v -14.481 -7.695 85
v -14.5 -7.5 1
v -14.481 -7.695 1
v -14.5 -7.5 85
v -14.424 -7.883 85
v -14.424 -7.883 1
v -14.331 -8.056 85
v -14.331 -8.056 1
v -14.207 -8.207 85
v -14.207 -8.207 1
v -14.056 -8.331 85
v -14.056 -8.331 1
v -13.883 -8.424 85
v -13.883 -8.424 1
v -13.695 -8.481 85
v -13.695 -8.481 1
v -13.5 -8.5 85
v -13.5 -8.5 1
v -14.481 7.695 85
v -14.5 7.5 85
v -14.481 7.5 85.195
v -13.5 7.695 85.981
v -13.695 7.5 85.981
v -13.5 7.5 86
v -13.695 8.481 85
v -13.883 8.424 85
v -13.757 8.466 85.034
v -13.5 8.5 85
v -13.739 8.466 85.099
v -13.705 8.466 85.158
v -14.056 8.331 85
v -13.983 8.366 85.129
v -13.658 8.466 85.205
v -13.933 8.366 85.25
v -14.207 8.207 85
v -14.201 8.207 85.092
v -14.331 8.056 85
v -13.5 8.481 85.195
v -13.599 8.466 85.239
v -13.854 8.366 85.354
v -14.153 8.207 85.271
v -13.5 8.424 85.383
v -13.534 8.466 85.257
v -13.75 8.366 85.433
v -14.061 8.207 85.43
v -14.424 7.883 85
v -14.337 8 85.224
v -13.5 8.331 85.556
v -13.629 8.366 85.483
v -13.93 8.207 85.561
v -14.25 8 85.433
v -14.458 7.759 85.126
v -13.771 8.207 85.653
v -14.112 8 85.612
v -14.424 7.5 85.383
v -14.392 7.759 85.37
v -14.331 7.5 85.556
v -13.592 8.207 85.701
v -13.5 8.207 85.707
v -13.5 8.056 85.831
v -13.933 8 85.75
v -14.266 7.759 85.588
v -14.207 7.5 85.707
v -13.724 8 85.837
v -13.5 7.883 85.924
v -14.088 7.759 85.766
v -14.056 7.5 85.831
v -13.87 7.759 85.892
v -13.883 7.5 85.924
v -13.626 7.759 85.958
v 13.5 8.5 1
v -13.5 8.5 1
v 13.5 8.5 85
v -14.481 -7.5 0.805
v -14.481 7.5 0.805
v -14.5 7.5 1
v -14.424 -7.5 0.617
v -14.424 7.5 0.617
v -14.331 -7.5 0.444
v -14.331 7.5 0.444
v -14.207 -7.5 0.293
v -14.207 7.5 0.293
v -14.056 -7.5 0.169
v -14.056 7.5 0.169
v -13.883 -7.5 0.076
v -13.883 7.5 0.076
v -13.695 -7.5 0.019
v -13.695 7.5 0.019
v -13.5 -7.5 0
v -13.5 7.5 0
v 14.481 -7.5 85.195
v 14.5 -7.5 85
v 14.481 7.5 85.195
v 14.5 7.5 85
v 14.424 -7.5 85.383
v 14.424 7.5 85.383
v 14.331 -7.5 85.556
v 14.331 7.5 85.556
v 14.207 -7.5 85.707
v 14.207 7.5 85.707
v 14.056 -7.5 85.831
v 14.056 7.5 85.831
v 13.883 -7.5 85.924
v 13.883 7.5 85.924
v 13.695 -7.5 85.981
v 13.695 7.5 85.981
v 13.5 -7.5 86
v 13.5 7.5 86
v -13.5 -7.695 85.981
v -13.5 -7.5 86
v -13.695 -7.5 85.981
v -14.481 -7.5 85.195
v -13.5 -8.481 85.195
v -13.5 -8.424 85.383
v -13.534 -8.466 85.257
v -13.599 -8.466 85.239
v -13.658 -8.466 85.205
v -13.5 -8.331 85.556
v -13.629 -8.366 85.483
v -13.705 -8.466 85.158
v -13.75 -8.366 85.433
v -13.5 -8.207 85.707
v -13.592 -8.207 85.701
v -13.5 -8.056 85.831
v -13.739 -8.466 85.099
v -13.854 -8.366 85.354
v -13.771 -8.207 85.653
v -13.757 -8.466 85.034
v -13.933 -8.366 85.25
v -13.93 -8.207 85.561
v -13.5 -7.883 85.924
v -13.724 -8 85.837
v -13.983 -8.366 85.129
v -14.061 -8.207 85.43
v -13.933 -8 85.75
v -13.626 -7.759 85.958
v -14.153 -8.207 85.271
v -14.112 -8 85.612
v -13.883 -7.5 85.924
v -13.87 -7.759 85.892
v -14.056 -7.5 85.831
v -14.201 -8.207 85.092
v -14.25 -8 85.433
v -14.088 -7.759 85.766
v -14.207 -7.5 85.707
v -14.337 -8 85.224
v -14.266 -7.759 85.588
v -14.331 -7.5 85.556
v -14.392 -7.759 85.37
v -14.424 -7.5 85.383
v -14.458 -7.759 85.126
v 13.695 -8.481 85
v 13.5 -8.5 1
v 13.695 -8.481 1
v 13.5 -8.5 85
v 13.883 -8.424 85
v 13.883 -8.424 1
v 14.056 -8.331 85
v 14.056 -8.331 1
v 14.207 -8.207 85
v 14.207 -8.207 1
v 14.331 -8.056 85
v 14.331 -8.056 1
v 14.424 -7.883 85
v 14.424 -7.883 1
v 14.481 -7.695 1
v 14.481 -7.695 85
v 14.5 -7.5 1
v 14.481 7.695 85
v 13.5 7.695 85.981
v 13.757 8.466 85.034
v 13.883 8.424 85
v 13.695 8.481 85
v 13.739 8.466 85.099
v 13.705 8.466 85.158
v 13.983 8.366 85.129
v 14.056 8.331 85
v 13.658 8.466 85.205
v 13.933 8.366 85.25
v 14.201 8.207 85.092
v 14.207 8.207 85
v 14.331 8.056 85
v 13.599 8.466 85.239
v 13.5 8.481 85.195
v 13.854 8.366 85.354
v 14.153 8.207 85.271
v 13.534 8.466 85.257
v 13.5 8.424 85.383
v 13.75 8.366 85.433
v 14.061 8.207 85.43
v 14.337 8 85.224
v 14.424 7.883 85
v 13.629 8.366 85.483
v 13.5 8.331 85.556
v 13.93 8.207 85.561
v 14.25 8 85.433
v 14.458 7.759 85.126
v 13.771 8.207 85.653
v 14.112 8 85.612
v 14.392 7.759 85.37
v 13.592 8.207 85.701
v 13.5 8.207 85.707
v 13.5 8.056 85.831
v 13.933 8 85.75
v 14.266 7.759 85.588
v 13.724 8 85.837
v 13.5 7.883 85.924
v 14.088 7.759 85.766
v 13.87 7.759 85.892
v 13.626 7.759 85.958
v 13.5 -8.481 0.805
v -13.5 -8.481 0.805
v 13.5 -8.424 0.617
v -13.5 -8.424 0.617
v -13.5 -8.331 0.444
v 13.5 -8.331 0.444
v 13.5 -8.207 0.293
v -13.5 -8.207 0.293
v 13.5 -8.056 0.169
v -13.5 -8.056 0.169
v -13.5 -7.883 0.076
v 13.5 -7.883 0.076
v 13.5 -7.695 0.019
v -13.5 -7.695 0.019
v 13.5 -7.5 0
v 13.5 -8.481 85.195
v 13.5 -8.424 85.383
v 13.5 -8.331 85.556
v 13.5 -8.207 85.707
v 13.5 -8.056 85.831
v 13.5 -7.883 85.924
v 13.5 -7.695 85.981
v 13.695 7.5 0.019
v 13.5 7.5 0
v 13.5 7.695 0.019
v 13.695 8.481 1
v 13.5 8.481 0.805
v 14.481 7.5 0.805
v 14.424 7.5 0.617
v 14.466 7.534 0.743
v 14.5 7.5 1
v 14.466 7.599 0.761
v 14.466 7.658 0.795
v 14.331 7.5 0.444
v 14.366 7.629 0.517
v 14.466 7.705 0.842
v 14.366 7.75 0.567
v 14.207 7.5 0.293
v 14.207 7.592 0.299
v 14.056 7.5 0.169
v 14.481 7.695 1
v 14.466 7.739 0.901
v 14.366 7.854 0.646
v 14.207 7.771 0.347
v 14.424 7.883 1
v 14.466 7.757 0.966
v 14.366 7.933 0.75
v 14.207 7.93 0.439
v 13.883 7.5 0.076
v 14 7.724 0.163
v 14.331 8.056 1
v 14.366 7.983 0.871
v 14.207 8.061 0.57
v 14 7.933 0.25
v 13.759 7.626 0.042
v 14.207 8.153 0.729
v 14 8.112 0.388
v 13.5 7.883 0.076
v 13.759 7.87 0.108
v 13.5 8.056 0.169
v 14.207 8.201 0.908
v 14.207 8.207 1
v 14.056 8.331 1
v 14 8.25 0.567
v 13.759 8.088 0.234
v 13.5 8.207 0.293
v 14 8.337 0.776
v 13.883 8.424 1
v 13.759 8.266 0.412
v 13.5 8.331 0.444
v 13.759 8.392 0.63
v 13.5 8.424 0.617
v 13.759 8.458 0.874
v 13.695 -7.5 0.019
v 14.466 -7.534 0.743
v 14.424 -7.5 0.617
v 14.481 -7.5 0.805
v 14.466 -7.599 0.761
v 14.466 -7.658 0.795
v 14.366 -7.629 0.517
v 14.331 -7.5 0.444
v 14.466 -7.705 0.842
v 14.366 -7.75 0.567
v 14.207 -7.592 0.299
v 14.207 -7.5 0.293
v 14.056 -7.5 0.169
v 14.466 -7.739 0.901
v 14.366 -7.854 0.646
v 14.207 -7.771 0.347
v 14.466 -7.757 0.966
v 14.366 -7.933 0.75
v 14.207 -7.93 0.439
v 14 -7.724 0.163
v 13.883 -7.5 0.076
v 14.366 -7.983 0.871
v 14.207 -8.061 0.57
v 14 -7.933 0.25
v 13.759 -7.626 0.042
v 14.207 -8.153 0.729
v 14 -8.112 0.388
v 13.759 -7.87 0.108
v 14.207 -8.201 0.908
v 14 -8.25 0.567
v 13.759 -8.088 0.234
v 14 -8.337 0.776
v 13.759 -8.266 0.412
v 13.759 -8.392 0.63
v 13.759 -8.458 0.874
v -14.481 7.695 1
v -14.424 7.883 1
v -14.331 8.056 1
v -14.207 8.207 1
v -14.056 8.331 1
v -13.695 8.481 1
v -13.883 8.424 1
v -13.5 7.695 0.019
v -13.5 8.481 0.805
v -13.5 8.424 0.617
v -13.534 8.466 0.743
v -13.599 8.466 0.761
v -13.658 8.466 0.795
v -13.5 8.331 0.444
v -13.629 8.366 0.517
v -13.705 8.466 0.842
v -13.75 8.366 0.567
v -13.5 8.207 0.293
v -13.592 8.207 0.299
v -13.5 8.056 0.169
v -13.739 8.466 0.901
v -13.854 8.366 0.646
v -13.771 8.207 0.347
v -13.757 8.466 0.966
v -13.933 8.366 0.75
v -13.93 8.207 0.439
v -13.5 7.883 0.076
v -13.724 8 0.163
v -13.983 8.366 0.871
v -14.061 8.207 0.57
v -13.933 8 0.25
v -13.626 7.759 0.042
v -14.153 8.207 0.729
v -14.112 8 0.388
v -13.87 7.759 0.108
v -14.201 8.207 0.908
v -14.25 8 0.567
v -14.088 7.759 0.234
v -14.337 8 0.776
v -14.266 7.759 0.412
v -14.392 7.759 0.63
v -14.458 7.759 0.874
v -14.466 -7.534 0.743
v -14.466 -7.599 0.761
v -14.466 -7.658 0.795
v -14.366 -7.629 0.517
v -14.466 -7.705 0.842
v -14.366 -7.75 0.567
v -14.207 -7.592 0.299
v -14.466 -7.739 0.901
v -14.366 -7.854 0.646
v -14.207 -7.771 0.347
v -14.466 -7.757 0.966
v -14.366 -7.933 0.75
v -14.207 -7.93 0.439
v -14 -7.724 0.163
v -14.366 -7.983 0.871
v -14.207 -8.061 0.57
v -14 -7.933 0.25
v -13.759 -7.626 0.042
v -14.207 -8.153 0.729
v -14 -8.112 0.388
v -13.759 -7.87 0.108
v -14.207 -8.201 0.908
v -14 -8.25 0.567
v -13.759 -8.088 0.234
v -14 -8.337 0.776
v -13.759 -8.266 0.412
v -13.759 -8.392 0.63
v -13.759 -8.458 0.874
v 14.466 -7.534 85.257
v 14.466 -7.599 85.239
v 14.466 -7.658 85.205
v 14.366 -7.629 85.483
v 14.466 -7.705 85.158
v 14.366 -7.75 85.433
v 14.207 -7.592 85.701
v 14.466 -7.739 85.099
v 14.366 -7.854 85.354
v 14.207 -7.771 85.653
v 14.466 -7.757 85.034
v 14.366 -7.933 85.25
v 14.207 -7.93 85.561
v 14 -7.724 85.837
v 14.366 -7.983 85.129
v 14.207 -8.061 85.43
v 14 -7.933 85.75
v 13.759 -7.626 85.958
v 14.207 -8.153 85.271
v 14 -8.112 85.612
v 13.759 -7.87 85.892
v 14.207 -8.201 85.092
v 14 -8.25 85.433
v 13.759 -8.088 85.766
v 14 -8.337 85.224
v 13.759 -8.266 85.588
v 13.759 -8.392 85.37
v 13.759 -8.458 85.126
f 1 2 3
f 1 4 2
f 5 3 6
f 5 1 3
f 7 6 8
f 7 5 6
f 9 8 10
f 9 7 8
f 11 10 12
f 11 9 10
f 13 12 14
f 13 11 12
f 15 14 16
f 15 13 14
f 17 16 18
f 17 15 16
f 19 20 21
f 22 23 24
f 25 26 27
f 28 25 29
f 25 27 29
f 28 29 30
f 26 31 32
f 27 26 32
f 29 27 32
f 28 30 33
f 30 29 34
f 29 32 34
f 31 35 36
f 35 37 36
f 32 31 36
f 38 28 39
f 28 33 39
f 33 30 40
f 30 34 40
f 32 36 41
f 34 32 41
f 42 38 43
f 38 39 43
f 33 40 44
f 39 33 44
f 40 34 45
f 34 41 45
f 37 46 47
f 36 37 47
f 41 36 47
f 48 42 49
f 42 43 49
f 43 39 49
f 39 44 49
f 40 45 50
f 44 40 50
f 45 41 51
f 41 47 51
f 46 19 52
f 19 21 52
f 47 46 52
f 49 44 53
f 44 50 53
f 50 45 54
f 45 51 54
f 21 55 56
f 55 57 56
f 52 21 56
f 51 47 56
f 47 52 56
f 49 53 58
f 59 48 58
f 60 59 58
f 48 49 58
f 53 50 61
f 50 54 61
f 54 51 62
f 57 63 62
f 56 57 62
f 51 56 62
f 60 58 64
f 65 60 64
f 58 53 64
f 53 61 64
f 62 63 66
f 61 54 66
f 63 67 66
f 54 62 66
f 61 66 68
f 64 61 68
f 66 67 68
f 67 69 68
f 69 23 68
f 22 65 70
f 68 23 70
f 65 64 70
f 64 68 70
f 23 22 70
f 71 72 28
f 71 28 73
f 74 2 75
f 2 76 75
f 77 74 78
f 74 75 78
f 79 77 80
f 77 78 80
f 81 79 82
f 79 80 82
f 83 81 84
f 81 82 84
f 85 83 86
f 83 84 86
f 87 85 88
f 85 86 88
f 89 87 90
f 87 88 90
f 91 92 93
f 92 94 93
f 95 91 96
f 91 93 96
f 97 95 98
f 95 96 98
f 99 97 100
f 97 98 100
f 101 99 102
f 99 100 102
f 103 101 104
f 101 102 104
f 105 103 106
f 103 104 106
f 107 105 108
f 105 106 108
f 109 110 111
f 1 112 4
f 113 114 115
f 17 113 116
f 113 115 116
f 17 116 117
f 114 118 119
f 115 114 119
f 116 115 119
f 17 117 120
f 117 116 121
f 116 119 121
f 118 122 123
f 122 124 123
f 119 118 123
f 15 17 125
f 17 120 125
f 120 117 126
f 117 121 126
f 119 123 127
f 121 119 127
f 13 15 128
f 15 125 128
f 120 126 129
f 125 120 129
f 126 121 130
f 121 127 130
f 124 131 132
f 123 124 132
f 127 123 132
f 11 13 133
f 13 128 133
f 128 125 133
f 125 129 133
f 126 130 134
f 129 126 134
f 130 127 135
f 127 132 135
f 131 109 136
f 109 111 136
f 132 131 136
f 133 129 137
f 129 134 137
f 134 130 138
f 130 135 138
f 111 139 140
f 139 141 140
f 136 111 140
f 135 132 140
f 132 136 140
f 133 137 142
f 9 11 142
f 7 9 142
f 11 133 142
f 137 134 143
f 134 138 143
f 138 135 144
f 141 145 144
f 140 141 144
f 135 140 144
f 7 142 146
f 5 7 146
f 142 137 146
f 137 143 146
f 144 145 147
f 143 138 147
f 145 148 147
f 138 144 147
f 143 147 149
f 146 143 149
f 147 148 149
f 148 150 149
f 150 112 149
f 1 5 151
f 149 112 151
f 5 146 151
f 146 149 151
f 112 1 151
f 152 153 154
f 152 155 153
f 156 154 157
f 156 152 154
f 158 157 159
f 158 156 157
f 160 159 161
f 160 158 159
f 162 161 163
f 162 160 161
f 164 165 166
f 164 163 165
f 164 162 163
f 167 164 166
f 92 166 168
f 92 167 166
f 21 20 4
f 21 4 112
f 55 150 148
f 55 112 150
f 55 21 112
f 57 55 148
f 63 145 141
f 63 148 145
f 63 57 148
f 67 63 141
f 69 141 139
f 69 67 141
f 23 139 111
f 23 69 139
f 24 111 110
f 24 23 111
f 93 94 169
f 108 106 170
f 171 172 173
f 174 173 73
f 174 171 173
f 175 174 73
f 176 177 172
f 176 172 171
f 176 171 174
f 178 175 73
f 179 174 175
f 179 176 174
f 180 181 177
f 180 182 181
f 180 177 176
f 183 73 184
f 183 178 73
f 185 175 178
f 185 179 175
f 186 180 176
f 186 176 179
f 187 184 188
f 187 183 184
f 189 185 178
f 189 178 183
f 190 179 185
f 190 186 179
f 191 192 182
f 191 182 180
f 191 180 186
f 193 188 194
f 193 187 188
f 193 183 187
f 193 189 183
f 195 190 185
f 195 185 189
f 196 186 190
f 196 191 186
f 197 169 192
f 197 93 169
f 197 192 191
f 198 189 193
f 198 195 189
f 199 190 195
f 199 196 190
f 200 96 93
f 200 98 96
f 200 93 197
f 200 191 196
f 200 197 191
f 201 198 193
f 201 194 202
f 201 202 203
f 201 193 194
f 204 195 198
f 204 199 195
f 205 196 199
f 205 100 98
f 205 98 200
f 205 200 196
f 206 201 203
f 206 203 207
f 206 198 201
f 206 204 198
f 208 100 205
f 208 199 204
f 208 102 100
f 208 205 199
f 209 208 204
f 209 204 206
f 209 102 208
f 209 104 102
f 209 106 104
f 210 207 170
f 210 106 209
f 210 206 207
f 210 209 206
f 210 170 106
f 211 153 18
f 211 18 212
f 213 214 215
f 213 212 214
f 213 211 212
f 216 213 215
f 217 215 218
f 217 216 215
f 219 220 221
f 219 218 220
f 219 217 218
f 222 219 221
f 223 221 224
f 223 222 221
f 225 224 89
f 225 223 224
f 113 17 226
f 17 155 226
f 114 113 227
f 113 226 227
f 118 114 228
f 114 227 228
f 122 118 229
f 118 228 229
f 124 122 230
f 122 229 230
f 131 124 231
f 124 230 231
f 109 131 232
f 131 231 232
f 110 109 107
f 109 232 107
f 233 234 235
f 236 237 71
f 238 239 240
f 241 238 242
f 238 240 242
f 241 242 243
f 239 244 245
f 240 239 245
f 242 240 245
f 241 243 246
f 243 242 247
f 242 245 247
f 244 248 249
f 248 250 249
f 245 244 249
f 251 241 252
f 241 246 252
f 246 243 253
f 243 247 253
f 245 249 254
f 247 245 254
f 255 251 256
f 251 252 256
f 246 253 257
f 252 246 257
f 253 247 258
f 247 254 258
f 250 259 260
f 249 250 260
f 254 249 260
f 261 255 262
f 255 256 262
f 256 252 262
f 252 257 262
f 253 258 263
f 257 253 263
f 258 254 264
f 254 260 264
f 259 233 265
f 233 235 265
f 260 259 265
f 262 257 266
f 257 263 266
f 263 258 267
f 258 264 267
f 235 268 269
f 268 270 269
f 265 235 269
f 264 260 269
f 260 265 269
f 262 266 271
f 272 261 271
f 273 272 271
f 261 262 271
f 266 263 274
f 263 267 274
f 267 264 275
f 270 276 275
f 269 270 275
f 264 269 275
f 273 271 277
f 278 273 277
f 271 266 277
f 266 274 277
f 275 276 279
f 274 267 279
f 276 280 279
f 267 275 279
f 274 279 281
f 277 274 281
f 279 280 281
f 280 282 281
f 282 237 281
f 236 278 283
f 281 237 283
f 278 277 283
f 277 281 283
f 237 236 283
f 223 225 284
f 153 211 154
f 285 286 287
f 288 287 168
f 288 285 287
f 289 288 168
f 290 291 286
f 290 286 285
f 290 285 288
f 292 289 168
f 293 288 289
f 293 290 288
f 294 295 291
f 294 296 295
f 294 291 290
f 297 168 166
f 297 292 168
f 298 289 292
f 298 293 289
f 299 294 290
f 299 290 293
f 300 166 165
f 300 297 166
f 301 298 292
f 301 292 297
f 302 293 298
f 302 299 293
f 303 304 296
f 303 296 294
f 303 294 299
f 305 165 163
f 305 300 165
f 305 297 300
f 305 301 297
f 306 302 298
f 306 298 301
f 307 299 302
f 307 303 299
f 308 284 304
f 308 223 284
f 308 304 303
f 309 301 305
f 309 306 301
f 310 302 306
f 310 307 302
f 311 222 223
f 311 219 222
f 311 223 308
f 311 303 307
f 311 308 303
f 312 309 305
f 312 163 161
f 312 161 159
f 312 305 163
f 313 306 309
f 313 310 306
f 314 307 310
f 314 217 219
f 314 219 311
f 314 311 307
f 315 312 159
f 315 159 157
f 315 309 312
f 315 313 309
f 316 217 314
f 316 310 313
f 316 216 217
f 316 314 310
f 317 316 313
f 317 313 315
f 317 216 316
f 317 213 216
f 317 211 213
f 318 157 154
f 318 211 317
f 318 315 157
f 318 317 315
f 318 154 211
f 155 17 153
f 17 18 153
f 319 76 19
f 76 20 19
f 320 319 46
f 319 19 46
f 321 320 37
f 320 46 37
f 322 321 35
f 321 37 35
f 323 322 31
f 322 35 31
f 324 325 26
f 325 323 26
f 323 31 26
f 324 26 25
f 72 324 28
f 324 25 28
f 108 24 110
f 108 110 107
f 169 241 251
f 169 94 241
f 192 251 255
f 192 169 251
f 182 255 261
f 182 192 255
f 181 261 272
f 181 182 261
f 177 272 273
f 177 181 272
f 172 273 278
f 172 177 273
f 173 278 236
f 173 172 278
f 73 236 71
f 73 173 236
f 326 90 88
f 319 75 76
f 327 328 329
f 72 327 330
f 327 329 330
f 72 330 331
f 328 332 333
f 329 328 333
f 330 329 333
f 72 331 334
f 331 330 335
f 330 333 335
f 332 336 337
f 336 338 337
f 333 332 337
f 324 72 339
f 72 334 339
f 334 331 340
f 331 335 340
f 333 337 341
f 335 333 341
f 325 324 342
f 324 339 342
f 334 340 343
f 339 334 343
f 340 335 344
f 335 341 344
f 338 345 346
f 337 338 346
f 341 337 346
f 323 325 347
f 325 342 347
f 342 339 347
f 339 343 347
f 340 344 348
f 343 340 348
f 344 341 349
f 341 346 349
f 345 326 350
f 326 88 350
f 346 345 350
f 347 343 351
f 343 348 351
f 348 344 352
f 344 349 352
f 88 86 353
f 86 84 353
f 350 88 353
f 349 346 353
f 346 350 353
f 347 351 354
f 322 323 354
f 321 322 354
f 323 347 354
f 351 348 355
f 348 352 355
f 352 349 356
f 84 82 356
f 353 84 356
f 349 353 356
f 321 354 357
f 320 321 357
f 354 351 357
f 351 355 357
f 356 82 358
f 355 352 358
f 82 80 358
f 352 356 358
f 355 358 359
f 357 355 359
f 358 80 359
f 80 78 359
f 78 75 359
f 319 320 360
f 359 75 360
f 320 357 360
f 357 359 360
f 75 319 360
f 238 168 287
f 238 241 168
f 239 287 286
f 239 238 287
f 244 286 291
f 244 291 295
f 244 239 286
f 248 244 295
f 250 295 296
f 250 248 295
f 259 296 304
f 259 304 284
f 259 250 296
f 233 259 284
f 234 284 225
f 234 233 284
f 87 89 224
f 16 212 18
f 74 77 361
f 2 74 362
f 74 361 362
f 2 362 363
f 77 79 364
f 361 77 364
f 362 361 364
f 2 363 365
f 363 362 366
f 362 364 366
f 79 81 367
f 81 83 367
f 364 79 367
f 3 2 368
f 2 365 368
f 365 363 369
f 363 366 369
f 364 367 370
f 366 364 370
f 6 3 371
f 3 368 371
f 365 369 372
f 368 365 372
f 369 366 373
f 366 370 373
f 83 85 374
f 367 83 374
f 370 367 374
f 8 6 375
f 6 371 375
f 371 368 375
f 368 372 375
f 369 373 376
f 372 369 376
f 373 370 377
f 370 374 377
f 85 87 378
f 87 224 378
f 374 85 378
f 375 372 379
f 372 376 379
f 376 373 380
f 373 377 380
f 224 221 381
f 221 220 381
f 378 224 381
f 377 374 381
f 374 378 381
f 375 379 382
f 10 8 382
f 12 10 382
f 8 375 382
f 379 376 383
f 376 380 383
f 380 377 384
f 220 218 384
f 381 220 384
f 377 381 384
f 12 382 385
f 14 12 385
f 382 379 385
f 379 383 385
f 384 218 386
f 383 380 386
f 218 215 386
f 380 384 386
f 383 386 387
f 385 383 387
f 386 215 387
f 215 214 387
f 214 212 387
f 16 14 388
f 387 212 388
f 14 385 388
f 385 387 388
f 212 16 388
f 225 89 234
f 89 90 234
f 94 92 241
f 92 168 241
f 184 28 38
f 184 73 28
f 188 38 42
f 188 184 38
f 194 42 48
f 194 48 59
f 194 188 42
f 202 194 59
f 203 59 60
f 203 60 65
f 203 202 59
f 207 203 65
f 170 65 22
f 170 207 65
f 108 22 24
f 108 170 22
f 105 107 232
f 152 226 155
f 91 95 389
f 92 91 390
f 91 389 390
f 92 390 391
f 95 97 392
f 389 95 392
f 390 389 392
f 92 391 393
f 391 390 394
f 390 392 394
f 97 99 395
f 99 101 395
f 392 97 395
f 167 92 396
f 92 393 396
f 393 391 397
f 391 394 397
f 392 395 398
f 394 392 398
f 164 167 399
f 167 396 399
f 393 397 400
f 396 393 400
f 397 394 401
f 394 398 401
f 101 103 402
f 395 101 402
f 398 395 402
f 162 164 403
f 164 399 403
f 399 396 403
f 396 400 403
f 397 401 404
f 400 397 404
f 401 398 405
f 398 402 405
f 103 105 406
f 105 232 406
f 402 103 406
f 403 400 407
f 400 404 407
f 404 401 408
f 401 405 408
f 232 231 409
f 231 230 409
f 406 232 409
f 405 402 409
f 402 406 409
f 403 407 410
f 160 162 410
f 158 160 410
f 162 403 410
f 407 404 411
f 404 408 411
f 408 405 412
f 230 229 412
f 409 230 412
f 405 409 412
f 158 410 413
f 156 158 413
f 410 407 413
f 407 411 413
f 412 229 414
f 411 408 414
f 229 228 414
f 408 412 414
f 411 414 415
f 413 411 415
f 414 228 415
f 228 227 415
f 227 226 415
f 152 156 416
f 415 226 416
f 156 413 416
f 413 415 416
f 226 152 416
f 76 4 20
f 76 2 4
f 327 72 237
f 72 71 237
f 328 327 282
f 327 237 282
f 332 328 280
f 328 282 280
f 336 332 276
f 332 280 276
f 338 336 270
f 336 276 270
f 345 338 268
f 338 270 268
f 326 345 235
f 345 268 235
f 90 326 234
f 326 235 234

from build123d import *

# Parameters (mm, degrees)
SKETCH1_W           = 29
SKETCH1_H           = 17
BOSS_EXTRUDE1_DEPTH = 86
FILLET1_R           = 1


with BuildPart() as part:
    # Sketch1 → Boss-Extrude1 (new body)
    with BuildSketch(Plane.XY):
        Rectangle(SKETCH1_W, SKETCH1_H)
    extrude(amount=BOSS_EXTRUDE1_DEPTH)

    # Fillet1
    fillet1_edges = [part.edges().sort_by_distance(p)[0] for p in [
        (-14.5, 0, 86),
        (0, -8.5, 86),
        (14.5, 0, 86),
        (0, -8.5, 0),
        (-14.5, 0, 0),
        (0, 8.5, 0),
        (14.5, 0, 0),
        (14.5, -8.5, 43),
        (-14.5, -8.5, 43),
        (-14.5, 8.5, 43),
        (14.5, 8.5, 43),
        (0, 8.5, 86),
    ]]
    fillet(fillet1_edges, radius=FILLET1_R)


solid = part.part
